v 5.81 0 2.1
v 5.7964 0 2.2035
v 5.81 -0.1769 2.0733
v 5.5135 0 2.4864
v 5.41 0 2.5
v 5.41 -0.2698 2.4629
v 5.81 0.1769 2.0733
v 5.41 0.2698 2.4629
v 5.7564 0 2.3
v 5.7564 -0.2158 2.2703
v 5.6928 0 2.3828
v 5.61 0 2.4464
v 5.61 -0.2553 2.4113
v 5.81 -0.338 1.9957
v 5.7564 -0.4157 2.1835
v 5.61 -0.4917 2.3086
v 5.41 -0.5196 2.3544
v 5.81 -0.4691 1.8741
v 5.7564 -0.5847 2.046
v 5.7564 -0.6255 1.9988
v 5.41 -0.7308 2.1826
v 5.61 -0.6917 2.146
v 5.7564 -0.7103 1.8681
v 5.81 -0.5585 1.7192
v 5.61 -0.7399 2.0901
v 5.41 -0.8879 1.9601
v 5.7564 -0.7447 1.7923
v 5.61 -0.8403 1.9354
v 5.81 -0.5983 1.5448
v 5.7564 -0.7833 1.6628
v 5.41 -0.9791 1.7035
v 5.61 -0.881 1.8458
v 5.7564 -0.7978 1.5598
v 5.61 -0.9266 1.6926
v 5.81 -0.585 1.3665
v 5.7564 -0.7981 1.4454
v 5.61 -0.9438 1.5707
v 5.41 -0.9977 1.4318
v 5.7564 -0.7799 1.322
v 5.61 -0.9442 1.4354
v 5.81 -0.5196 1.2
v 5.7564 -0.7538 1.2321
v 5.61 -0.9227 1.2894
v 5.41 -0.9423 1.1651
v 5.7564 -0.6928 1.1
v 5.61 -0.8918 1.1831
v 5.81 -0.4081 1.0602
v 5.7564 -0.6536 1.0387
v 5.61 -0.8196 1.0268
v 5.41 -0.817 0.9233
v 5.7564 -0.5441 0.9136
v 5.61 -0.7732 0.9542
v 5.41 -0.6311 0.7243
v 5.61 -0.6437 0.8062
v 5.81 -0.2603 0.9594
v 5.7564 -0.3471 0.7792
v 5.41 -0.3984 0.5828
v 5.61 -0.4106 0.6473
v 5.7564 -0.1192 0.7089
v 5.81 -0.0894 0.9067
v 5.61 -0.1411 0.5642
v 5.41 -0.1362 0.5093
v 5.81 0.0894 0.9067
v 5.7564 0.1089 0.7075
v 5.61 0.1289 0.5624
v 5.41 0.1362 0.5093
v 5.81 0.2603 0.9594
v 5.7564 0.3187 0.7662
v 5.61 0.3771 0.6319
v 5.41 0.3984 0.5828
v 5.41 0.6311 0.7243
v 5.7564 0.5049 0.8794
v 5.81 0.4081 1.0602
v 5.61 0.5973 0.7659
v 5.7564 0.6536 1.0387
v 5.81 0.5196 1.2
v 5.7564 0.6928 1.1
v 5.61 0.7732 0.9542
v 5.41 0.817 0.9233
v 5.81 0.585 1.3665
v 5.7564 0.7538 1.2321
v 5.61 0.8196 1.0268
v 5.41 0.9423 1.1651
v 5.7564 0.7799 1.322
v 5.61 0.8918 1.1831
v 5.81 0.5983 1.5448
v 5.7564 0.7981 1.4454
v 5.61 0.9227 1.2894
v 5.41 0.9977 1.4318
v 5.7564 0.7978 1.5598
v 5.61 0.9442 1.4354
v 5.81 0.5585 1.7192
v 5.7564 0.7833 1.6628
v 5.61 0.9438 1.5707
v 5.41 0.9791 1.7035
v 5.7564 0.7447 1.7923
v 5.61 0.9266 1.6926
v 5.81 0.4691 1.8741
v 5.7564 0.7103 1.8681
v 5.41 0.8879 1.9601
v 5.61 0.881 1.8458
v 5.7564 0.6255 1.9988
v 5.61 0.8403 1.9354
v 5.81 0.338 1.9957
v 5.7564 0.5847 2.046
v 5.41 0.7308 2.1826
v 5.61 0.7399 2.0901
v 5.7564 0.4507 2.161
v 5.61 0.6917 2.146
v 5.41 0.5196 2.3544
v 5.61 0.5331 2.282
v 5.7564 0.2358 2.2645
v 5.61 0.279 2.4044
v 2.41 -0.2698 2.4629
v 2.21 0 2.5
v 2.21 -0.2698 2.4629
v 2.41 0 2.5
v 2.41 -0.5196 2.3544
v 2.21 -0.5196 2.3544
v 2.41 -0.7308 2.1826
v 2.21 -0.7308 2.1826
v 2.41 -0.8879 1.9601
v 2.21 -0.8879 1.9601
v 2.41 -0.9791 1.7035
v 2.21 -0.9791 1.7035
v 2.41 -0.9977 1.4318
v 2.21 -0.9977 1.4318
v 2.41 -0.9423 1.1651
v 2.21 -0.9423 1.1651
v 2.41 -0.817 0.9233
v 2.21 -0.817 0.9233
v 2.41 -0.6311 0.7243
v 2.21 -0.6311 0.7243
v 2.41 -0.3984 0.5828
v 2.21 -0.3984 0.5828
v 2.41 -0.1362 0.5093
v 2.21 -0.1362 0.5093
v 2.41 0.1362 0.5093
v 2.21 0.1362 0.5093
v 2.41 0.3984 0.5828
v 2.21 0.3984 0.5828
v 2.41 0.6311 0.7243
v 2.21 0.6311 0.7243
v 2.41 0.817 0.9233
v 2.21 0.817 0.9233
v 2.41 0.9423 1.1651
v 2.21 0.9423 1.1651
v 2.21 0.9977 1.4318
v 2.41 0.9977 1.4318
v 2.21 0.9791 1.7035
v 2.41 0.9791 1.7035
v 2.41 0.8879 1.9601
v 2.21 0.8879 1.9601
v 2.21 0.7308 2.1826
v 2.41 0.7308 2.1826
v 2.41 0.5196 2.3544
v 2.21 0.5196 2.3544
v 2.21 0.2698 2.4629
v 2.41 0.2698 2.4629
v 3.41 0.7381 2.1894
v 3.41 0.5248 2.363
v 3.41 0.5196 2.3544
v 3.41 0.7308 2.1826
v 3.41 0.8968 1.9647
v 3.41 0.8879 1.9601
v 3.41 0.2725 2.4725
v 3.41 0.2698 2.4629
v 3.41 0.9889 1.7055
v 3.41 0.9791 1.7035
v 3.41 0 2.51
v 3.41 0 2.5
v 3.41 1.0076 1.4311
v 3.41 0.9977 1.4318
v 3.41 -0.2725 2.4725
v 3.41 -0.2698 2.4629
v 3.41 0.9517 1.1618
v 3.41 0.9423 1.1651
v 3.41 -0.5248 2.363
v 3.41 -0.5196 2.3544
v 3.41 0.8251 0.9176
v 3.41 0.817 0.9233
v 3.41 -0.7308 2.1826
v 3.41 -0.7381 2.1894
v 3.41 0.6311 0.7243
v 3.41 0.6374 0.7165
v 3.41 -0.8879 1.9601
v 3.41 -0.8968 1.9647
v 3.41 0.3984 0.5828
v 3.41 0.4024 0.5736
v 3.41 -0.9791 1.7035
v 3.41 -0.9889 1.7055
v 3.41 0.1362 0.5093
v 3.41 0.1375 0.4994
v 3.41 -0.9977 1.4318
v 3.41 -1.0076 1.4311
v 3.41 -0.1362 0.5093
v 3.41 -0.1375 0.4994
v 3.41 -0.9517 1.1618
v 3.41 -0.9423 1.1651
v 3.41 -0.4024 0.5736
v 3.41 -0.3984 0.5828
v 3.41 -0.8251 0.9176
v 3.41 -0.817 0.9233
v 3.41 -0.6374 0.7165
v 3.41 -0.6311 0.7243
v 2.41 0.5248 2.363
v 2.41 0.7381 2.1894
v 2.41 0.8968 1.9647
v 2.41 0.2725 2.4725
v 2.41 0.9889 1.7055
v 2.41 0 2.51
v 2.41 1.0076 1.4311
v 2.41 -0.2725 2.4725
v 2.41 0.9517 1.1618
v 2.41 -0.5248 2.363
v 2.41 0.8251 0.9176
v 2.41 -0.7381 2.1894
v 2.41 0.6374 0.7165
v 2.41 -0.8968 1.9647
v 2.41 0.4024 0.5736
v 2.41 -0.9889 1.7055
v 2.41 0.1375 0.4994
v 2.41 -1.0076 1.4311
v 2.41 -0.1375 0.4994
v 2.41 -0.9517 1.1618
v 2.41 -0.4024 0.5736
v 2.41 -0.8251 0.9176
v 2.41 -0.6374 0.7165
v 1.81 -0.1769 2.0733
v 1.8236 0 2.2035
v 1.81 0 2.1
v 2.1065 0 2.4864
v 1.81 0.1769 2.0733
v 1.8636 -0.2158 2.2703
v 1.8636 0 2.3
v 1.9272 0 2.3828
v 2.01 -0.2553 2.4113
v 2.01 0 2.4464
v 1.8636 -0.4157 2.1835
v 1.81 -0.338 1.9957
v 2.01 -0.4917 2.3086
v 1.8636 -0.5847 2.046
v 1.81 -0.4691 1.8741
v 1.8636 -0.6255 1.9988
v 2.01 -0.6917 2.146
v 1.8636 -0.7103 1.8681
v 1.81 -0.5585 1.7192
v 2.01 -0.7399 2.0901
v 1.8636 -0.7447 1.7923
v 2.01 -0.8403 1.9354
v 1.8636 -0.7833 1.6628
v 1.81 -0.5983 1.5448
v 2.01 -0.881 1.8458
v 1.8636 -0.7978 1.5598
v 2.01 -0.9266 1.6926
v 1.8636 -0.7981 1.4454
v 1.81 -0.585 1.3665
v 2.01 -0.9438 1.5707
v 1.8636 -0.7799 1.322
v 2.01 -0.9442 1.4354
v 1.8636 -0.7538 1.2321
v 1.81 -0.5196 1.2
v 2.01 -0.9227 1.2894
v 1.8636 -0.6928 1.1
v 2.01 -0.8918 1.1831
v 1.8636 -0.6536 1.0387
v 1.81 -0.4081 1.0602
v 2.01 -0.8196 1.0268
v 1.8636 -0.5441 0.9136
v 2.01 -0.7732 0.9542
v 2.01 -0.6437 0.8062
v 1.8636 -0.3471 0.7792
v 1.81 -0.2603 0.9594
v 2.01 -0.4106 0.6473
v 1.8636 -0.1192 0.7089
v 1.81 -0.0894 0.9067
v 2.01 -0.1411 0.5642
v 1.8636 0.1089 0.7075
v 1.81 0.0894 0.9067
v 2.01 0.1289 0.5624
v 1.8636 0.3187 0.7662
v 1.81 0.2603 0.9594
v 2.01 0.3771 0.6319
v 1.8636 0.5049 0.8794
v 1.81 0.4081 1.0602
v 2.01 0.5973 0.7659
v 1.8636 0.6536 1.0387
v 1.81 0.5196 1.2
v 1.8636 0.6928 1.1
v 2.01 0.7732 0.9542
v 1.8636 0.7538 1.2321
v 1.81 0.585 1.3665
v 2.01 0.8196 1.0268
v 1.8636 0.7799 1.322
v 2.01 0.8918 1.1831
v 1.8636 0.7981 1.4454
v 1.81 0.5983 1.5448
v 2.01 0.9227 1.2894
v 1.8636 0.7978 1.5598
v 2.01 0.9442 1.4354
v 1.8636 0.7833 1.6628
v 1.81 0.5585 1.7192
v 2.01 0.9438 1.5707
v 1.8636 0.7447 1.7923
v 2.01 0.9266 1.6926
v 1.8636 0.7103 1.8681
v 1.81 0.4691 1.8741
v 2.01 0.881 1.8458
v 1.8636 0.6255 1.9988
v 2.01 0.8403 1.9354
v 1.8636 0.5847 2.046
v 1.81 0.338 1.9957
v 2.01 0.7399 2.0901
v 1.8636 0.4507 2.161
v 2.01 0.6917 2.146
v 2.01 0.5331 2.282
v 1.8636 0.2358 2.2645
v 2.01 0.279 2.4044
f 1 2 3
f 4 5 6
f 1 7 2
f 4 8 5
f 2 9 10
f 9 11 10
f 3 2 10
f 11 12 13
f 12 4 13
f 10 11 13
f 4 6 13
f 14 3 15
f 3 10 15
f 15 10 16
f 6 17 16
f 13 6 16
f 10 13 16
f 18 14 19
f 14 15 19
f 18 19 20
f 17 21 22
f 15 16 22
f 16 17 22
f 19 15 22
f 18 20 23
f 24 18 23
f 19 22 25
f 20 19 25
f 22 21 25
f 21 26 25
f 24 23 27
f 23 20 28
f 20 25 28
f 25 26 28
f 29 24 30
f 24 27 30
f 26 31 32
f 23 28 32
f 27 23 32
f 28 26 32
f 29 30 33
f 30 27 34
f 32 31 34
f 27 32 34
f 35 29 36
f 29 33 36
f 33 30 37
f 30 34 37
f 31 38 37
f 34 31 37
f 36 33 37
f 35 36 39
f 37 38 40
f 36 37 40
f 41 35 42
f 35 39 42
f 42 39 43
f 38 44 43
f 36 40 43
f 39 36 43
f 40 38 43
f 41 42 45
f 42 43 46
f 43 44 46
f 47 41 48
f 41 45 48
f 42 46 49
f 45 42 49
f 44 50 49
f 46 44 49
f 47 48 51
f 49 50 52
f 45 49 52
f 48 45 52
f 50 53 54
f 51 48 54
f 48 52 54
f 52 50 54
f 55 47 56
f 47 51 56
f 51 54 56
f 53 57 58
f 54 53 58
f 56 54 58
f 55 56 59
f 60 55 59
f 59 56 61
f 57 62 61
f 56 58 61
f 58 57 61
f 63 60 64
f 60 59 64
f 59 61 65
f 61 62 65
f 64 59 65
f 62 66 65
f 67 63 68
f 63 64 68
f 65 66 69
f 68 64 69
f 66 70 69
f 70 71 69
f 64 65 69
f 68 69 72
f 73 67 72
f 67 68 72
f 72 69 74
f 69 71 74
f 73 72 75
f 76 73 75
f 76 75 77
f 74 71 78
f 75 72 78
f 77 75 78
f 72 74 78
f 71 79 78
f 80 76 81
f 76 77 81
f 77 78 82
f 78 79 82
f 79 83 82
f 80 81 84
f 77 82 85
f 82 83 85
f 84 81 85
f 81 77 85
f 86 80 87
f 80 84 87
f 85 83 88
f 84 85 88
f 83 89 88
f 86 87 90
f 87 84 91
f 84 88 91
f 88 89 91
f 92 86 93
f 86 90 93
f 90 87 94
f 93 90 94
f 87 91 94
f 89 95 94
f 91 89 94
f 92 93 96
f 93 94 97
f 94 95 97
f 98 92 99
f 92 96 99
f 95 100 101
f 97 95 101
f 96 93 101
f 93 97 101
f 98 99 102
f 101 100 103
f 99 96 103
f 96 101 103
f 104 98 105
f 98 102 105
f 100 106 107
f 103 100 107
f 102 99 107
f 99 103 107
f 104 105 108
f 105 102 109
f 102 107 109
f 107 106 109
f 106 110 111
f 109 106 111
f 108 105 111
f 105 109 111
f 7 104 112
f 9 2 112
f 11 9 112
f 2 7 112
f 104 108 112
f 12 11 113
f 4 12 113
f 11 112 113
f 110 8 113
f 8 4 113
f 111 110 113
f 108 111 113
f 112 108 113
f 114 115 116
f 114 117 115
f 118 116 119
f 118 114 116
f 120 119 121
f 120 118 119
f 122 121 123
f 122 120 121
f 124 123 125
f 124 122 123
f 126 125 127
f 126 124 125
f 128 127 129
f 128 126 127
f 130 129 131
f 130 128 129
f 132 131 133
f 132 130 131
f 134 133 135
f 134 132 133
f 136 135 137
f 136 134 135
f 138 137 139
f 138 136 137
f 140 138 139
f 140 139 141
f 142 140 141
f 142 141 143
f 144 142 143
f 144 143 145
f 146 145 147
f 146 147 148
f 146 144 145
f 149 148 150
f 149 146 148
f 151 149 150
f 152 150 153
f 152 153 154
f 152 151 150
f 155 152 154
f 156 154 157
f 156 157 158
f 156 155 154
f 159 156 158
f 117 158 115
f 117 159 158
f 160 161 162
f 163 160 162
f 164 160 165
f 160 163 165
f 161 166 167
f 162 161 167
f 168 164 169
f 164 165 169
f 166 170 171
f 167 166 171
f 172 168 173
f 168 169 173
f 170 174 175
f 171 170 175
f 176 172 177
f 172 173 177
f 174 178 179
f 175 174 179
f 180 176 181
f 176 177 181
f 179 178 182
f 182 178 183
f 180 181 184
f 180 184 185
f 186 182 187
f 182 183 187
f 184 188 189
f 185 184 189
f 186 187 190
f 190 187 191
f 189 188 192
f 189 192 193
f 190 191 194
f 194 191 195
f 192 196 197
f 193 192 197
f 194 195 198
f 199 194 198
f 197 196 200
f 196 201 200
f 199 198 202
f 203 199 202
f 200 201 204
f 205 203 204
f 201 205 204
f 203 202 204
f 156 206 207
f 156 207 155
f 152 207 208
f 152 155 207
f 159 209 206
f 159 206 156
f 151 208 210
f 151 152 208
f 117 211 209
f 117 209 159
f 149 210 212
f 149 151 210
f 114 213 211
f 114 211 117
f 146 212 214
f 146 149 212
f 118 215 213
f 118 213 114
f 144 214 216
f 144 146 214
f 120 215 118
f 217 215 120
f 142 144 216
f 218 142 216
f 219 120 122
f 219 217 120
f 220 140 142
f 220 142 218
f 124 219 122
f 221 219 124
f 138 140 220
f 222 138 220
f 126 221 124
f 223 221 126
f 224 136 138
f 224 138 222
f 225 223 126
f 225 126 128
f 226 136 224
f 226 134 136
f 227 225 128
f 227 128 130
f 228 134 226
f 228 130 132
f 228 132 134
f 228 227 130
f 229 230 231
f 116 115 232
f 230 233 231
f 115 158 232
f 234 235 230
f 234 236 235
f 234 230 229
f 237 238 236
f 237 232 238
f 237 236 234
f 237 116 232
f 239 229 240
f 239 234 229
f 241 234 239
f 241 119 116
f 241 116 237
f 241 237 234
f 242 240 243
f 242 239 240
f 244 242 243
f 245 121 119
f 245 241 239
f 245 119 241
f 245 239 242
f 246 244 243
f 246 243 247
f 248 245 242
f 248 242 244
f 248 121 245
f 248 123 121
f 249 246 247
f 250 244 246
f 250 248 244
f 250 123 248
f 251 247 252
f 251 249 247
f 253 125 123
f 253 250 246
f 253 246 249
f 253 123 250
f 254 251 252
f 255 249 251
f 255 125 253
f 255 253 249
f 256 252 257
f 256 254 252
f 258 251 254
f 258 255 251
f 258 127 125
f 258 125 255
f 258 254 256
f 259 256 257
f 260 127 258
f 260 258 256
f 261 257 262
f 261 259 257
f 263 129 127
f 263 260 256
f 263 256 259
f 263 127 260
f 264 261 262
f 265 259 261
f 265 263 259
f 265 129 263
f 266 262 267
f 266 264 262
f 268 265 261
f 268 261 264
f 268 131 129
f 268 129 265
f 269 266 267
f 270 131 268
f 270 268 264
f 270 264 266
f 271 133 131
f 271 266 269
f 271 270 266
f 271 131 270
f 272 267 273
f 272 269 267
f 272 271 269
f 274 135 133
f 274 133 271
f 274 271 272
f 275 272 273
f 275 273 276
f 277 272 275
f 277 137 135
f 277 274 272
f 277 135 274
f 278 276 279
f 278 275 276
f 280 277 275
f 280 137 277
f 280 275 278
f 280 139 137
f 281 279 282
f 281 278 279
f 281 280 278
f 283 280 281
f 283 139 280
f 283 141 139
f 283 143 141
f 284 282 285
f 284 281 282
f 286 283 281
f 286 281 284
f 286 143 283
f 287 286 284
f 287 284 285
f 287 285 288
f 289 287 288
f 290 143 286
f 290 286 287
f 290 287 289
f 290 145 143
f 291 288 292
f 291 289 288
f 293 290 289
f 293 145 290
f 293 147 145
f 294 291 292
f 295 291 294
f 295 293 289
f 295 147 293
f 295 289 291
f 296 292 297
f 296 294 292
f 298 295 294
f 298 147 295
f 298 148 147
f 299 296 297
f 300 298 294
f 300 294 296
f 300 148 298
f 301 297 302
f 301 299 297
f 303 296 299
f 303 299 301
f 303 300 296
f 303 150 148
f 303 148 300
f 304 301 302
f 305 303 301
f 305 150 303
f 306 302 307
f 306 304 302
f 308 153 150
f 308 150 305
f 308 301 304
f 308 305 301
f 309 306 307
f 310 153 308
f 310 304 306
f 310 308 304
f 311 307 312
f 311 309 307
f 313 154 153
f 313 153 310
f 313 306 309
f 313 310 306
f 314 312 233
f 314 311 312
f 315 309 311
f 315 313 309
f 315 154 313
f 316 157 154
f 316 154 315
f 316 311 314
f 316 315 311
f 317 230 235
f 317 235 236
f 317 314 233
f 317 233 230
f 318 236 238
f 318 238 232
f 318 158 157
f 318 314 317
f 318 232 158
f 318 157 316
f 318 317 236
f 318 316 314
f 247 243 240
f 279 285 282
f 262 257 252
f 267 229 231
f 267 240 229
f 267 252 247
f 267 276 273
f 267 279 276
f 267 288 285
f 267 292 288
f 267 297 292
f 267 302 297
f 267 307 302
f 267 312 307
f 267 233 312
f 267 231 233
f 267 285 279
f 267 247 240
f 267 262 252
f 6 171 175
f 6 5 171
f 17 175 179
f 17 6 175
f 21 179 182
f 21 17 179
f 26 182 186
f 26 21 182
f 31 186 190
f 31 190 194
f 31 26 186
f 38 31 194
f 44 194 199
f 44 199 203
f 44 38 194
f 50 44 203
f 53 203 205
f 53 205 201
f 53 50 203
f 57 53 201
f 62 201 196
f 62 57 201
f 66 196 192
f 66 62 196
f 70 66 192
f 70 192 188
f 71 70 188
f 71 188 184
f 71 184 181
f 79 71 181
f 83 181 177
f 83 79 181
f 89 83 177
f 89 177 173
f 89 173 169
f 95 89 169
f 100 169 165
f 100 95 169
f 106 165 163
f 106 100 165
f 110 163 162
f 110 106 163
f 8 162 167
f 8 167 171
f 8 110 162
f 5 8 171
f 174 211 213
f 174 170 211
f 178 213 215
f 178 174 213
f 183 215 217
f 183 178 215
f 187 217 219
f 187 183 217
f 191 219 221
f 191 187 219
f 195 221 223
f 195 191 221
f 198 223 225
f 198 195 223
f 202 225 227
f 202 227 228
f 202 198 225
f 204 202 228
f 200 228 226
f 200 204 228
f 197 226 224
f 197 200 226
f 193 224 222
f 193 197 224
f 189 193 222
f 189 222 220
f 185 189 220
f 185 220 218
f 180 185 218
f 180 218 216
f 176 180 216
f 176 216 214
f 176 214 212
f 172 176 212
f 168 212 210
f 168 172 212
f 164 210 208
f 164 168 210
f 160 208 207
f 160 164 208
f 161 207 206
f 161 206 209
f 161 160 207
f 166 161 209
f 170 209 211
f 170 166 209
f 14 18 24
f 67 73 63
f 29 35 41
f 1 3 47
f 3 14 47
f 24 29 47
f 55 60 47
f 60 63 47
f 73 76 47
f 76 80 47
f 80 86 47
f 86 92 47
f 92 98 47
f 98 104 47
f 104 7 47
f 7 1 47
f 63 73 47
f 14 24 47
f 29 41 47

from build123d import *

# Parameters (mm, degrees)
SKETCH003_W = 1
SKETCH003_H = 0.02
SKETCH002_W = 4
SKETCH002_H = 1
FILLET_R    = 0.4


with BuildPart() as revolution001:
    # Sketch003 → Revolution001 (revolve)
    with BuildSketch(Plane.XZ):
        with Locations((2.91, 2.5)):
            Rectangle(SKETCH003_W, SKETCH003_H)
    revolve(axis=Axis((0, 0, 1.5), (1, 0, 0)))


with BuildPart() as fillet_fd:
    # Sketch002 → Revolution (revolve)
    with BuildSketch(Plane.XZ):
        with Locations((3.81, 2)):
            Rectangle(SKETCH002_W, SKETCH002_H)
    revolve(axis=Axis((1.81, 0, 1.5), (1, 0, 0)))

    # Fillet
    fillet_edges = [fillet_fd.edges().sort_by_distance(p)[0] for p in [
        (1.81, 0, 0.5),
        (5.81, 0, 0.5),
    ]]
    fillet(fillet_edges, radius=FILLET_R)

    # Fillet_mp_cp: union Revolution001
    add(revolution001.part)


solid = fillet_fd.part
